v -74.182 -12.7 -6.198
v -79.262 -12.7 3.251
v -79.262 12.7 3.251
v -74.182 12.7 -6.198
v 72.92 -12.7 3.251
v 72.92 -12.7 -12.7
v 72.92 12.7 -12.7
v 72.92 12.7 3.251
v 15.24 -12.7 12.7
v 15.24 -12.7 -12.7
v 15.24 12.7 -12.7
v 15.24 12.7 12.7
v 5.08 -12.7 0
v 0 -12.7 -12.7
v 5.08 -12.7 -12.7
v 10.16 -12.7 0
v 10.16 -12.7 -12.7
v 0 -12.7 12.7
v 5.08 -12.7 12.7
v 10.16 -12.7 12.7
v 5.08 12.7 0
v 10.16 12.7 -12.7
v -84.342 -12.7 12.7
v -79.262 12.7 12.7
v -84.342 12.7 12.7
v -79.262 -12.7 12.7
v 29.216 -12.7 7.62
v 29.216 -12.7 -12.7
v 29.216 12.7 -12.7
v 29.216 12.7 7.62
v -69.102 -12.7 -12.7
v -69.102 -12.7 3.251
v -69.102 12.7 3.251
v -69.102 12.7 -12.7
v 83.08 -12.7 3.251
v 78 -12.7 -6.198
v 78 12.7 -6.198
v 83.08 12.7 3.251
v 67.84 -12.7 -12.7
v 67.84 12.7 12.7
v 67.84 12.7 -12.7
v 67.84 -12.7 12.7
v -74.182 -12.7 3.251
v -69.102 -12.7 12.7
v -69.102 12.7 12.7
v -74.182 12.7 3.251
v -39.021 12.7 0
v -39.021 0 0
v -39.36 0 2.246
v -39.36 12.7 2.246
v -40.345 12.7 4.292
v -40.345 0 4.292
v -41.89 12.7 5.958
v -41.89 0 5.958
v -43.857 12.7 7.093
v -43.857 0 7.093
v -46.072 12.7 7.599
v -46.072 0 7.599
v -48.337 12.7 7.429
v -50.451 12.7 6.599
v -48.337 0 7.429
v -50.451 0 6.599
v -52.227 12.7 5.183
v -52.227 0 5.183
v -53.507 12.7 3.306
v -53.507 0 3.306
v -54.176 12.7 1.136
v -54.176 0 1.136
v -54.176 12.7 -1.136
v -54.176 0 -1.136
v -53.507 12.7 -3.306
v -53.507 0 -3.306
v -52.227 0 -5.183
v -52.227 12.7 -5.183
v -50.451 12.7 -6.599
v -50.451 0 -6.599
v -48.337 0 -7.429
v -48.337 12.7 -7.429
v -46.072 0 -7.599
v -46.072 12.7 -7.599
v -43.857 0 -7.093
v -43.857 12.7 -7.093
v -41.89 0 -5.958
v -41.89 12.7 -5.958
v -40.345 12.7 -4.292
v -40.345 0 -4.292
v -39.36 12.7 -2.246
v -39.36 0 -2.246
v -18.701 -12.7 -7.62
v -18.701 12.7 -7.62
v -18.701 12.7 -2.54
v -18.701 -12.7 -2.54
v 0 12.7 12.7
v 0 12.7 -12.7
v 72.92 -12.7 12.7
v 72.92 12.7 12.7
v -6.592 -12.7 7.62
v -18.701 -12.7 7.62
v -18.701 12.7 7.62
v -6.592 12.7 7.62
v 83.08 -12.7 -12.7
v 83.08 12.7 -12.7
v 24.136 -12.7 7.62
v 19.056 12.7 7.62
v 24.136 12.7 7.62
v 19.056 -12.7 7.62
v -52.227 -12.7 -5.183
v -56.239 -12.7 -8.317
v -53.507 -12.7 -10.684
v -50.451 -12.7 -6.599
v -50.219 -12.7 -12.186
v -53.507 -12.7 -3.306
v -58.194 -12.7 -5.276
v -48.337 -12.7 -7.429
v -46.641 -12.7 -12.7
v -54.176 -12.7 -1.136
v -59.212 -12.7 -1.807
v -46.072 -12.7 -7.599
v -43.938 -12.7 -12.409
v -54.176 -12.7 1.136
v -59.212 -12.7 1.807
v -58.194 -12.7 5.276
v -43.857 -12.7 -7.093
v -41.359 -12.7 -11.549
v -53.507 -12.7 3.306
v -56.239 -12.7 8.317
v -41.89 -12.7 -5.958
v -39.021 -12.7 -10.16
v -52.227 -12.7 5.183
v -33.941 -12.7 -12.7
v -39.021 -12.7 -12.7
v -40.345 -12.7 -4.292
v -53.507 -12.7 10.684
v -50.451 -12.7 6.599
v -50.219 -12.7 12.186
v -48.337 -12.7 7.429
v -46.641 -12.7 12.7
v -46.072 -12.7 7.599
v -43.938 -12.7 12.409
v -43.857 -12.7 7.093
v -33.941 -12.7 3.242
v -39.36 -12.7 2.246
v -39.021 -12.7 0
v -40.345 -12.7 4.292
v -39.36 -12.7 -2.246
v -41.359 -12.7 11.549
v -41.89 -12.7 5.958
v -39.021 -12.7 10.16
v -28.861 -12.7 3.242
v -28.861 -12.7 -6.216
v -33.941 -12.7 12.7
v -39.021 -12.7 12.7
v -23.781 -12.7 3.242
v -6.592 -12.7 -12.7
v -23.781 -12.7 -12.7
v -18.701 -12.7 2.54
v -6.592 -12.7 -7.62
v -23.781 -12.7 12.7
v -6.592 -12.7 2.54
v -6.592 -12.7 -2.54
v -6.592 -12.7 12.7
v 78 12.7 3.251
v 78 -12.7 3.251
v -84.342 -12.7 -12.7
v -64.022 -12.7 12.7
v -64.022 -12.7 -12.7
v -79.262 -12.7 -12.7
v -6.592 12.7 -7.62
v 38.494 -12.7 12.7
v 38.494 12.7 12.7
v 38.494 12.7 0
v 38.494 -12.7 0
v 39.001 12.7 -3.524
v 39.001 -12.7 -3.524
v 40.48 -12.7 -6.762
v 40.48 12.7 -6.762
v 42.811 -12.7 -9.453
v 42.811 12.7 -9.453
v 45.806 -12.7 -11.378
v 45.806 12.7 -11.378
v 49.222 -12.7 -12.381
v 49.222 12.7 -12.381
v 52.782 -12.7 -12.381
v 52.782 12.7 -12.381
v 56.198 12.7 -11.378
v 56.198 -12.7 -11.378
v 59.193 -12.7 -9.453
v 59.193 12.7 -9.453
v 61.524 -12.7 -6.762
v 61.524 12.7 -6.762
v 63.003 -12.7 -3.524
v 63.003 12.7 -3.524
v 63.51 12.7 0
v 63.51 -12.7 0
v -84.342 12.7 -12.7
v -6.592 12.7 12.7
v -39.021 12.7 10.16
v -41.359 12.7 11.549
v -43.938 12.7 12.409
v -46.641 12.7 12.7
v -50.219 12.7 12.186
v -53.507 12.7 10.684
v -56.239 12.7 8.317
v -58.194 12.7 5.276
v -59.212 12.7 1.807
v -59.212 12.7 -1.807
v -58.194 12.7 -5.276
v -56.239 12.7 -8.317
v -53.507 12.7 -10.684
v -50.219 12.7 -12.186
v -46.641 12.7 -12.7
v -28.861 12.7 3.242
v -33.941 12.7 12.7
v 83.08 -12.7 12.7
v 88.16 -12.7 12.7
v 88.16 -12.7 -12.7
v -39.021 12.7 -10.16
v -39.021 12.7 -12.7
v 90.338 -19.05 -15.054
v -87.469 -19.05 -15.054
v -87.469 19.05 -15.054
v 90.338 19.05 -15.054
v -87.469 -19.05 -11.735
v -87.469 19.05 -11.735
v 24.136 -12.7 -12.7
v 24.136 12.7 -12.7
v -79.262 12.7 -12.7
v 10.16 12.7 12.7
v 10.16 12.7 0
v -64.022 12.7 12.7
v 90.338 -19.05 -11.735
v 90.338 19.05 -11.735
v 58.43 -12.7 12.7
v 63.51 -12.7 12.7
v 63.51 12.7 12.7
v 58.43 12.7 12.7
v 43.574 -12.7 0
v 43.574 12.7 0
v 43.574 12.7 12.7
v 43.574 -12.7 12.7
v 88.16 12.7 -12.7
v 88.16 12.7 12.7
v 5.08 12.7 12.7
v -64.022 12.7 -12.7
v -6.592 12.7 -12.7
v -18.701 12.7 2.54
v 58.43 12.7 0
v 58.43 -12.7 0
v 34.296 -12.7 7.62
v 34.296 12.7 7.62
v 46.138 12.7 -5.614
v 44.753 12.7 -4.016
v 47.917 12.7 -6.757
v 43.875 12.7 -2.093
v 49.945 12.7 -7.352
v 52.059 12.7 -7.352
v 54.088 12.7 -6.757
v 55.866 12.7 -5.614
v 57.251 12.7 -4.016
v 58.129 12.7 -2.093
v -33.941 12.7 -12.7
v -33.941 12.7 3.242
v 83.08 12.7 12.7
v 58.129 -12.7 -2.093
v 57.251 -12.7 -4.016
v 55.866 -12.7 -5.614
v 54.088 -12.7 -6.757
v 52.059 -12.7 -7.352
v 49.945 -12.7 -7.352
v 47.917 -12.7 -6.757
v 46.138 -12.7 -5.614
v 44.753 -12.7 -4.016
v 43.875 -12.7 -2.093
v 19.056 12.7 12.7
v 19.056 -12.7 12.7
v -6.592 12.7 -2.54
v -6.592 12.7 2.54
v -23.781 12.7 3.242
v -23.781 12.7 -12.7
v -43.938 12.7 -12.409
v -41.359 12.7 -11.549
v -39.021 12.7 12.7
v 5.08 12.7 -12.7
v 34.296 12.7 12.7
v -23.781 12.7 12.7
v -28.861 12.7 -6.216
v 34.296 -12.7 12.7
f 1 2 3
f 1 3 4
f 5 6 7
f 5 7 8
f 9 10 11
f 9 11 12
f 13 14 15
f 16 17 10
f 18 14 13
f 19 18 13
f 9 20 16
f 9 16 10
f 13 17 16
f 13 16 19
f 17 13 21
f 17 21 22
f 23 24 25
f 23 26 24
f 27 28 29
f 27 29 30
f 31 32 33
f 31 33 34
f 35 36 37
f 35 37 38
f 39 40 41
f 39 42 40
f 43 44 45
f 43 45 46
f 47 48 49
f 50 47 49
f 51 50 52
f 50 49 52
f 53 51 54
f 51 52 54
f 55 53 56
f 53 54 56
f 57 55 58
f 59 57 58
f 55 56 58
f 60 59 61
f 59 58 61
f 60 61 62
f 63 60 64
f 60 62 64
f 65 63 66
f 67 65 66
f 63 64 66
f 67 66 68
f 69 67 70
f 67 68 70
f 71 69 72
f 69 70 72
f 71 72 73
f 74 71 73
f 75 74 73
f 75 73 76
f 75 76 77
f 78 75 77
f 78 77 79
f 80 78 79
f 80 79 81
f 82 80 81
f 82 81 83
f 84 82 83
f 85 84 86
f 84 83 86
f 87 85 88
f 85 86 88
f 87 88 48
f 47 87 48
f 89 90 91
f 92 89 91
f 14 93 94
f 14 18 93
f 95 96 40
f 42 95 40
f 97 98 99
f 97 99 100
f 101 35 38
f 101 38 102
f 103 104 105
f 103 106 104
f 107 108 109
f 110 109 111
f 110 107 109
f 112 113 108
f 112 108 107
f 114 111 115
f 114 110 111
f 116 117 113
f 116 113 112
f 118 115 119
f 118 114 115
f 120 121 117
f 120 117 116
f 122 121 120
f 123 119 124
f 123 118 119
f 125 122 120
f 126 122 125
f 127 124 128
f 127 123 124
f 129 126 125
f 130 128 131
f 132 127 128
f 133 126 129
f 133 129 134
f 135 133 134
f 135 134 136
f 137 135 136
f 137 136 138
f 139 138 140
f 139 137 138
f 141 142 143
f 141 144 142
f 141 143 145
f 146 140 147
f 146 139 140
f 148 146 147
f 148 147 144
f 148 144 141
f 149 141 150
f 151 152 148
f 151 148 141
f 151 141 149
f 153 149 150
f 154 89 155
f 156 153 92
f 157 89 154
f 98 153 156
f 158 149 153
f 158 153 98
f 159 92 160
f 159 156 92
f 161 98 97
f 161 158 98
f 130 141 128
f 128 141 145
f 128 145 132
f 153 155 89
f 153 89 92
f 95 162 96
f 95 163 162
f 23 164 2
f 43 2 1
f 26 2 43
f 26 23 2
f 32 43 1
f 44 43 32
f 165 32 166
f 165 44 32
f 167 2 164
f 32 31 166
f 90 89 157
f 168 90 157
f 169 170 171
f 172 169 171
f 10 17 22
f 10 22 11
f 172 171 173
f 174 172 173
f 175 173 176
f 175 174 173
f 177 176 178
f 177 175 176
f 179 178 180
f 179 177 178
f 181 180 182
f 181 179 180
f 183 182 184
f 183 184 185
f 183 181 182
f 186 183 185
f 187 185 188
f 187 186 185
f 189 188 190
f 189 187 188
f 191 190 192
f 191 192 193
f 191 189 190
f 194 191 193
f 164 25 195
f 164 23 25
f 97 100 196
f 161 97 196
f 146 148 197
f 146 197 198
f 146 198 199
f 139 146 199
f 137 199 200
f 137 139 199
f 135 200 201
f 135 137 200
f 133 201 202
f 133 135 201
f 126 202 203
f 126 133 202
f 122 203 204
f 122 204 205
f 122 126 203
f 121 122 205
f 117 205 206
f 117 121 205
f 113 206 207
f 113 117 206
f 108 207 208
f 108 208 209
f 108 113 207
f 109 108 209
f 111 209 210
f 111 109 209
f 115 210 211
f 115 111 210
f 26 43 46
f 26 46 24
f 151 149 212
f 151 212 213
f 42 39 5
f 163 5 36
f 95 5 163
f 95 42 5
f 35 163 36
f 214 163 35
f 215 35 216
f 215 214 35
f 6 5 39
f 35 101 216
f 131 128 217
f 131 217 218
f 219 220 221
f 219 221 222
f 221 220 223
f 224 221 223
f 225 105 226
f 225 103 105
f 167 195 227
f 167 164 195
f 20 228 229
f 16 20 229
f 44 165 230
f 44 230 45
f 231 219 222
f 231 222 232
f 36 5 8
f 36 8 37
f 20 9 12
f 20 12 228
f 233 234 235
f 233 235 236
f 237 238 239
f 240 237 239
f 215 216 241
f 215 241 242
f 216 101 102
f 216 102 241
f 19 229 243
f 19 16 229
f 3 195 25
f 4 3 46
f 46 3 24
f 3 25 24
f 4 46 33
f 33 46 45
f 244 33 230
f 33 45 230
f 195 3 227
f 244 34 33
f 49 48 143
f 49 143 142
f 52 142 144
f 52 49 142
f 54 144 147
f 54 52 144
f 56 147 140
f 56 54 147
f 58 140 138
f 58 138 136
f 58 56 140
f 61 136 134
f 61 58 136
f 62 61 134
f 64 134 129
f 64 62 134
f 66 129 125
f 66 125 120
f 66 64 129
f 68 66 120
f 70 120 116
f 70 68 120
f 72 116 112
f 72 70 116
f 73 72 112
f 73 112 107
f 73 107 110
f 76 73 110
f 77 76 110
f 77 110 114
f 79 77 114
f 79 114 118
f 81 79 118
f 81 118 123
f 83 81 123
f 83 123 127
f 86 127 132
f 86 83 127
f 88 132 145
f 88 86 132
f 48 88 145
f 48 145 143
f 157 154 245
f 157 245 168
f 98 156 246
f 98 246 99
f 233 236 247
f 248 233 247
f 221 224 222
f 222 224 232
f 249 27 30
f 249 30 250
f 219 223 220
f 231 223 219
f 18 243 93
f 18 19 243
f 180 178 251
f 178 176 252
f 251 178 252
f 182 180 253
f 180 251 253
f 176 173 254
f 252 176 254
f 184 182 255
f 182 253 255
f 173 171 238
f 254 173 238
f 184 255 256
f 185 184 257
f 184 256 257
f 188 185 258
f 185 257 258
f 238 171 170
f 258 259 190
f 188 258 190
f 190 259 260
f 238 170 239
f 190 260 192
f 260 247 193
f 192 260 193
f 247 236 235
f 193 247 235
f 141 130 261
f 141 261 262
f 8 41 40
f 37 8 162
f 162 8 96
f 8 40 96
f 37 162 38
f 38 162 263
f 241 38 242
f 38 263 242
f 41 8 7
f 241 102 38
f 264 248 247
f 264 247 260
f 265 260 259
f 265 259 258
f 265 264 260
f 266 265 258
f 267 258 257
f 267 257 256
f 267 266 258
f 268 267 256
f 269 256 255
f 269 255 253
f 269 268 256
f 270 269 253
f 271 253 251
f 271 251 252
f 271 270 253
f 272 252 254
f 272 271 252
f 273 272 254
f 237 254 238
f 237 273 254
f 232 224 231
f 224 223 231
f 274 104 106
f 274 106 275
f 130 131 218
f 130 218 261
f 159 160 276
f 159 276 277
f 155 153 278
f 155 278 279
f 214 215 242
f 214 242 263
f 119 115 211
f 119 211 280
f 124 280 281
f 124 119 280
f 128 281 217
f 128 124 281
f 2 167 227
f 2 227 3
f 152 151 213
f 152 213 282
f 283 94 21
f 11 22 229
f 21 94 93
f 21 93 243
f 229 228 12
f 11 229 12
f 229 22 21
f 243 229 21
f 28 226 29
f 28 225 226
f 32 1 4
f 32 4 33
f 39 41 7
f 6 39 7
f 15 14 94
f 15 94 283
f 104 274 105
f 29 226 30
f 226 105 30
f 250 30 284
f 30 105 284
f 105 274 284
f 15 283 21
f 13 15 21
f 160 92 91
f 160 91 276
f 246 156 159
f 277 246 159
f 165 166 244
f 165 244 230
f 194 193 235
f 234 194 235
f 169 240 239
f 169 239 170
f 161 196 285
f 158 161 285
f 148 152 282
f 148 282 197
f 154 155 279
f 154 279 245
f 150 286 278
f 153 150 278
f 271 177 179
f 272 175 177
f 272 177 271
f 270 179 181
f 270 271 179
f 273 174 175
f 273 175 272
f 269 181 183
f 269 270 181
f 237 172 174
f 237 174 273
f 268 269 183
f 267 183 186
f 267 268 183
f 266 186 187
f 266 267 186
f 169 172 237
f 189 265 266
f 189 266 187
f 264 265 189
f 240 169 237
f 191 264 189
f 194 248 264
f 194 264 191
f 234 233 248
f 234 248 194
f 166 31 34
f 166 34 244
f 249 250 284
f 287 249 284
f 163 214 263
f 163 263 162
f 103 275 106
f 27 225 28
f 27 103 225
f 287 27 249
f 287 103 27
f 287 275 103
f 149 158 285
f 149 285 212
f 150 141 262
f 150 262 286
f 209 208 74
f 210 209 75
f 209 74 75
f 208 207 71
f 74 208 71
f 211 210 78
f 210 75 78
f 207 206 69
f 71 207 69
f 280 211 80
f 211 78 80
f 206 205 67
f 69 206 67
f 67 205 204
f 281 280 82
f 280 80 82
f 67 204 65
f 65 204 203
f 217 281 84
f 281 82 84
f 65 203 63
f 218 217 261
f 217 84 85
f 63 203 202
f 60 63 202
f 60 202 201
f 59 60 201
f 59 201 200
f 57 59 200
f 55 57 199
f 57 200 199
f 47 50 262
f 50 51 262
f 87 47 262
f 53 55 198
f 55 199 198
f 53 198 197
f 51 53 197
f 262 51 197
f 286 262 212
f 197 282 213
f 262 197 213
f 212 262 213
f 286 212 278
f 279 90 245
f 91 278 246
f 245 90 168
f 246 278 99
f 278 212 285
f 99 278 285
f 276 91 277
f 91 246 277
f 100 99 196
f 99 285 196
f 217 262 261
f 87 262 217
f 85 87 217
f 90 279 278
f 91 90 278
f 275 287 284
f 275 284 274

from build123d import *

# Parameters (mm, degrees)
F1_DEPTH = 6.35
F0_R     = 3.81
F0_W     = 6.0548761711
F0_H     = 2.54
F0_W_2   = 2.54
F0_H_2   = 10.16
F2_W     = 88.9036133885
F2_H     = 1.6595339403
F3_DEPTH = 9.525
F4_SCALE = 2


with BuildPart() as f1:
    # F0 (on Front) → F1 (new body, symmetric)
    with BuildSketch(Plane.XZ):
        Polygon((-42.1707964678, -6.35), (-39.6307964678, -6.35), (-39.6307964678, 1.6256), (-42.1707964678, 6.35), align=None)
        Polygon((-42.1707964678, 6.35), (-39.6307964678, 1.6256), (-39.6307964678, 6.35), align=None)
        Polygon((-39.6307964678, 6.35), (-39.6307964678, 1.6256), (-37.0907964678, -3.0988), (-37.0907964678, 1.6256), align=None)
        Polygon((-37.0907964678, 1.6256), (-37.0907964678, -3.0988), (-34.5507964678, 1.6256), (-34.5507964678, 6.35), align=None)
        Polygon((-34.5507964678, 6.35), (-34.5507964678, 1.6256), (-32.0107964678, 6.35), align=None)
        Polygon((-34.5507964678, 1.6256), (-34.5507964678, -6.35), (-32.0107964678, -6.35), (-32.0107964678, 6.35), align=None)
    extrude(amount=F1_DEPTH, both=True)


with BuildPart() as f1b:
    # F0 (on Front) → F1, piece 2 (new body, symmetric)
    with BuildSketch(Plane.XZ):
        with BuildLine():
            ThreePointArc((-23.3206523725, 6.35), (-29.6706523725, 0), (-23.3206523725, -6.35))
            ThreePointArc((-23.3206523725, -6.35), (-21.3126060583, -6.0241389426), (-19.5106523725, -5.08))
            Line((-19.5106523725, -5.08), (-19.5106523725, 0))
            Line((-19.5106523725, 0), (-19.5106523725, 5.08))
            ThreePointArc((-19.5106523725, 5.08), (-21.3126060583, 6.0241389426), (-23.3206523725, 6.35))
        make_face()
        with Locations((-23.3206523725, 0)):
            Circle(F0_R, mode=Mode.SUBTRACT)
        with BuildLine():
            ThreePointArc((-16.9706523725, 0), (-17.6410397097, 2.8398063314), (-19.5106523725, 5.08))
            Line((-19.5106523725, 5.08), (-19.5106523725, 0))
            Line((-19.5106523725, 0), (-16.9706523725, 0))
        make_face()
        with BuildLine():
            Line((-19.5106523725, 0), (-19.5106523725, -5.08))
            ThreePointArc((-19.5106523725, -5.08), (-17.6410397097, -2.8398063314), (-16.9706523725, 0))
            Line((-16.9706523725, 0), (-19.5106523725, 0))
        make_face()
        with BuildLine():
            Line((-19.5106523725, -5.08), (-19.5106523725, -6.35))
            Line((-19.5106523725, -6.35), (-16.9706523725, -6.35))
            Line((-16.9706523725, -6.35), (-16.9706523725, 0))
            ThreePointArc((-16.9706523725, 0), (-17.6410397097, -2.8398063314), (-19.5106523725, -5.08))
        make_face()
        Polygon((-16.9706523725, 6.35), (-19.5106523725, 6.35), (-16.9706523725, 1.621060252), align=None)
        with BuildLine():
            Line((-16.9706523725, 1.621060252), (-19.5106523725, 6.35))
            Line((-19.5106523725, 6.35), (-19.5106523725, 5.08))
            ThreePointArc((-19.5106523725, 5.08), (-17.6410397097, 2.8398063314), (-16.9706523725, 0))
            Line((-16.9706523725, 0), (-16.9706523725, 1.621060252))
        make_face()
        Polygon((-14.4306523725, 1.621060252), (-16.9706523725, 6.35), (-16.9706523725, 1.621060252), (-14.4306523725, -3.1078794961), align=None)
        Polygon((-11.8906523725, 6.35), (-14.4306523725, 1.621060252), (-14.4306523725, -3.1078794961), (-11.8906523725, 1.621060252), (-11.8906523725, 3.81), align=None)
        Polygon((-9.3506523725, 6.35), (-11.8906523725, 6.35), (-11.8906523725, 3.81), (-10.7149328125, 3.81), align=None)
        Polygon((-11.8906523725, 3.81), (-11.8906523725, 1.621060252), (-10.7149328125, 3.81), align=None)
        with Locations((-6.323214287, 5.08)):
            Rectangle(F0_W, F0_H)
        Polygon((-10.7149328125, 3.81), (-11.8906523725, 1.621060252), (-11.8906523725, 1.27), (-9.3506523725, 1.27), (-9.3506523725, 3.81), align=None)
        Polygon((-9.3506523725, 3.81), (-9.3506523725, 6.35), (-10.7149328125, 3.81), align=None)
        with Locations((-10.6206523725, 0)):
            Rectangle(F0_W_2, F0_H)
        with Locations((-6.323214287, 0)):
            Rectangle(F0_W, F0_H)
        with Locations((-10.6206523725, -2.54)):
            Rectangle(F0_W_2, F0_H)
        with Locations((-10.6206523725, -5.08)):
            Rectangle(F0_W_2, F0_H)
        with Locations((-6.323214287, -5.08)):
            Rectangle(F0_W, F0_H)
    extrude(amount=F1_DEPTH, both=True)


with BuildPart() as f1c:
    # F0 (on Front) → F1, piece 3 (new body, symmetric)
    with BuildSketch(Plane.XZ):
        Polygon((0, 6.35), (0, -6.35), (2.54, -6.35), (2.54, 0), align=None)
        Polygon((2.54, 6.35), (0, 6.35), (2.54, 0), align=None)
        Polygon((5.08, 0), (2.54, 6.35), (2.54, 0), (5.08, -6.35), align=None)
        Polygon((5.08, 0), (5.08, -6.35), (7.62, -6.35), align=None)
        Polygon((5.08, 6.35), (5.08, 0), (7.62, -6.35), (7.62, 6.35), align=None)
    extrude(amount=F1_DEPTH, both=True)


with BuildPart() as f1d:
    # F0 (on Front) → F1, piece 4 (new body, symmetric)
    with BuildSketch(Plane.XZ):
        with Locations((13.3382392576, -1.27)):
            Rectangle(F0_W_2, F0_H_2)
        with Locations((15.8782392576, 5.08)):
            Rectangle(F0_W_2, F0_H)
        with Locations((13.3382392576, 5.08)):
            Rectangle(F0_W_2, F0_H)
        with Locations((10.7982392576, 5.08)):
            Rectangle(F0_W_2, F0_H)
    extrude(amount=F1_DEPTH, both=True)


with BuildPart() as f1e:
    # F0 (on Front) → F1, piece 5 (new body, symmetric)
    with BuildSketch(Plane.XZ):
        with BuildLine():
            Line((31.7550115287, 0), (31.7550115287, 6.35))
            Line((31.7550115287, 6.35), (29.2150115287, 6.35))
            Line((29.2150115287, 6.35), (29.2150115287, 0))
            ThreePointArc((29.2150115287, 0), (25.5010910332, -3.7139204955), (21.7871705377, 0))
            Line((21.7871705377, 0), (21.7871705377, 6.35))
            Line((21.7871705377, 6.35), (19.2471705377, 6.35))
            Line((19.2471705377, 6.35), (19.2471705377, 0))
            ThreePointArc((19.2471705377, 0), (25.5010910332, -6.2539204955), (31.7550115287, 0))
        make_face()
    extrude(amount=F1_DEPTH, both=True)


with BuildPart() as f1f:
    # F0 (on Front) → F1, piece 6 (new body, symmetric)
    with BuildSketch(Plane.XZ):
        Polygon((33.9198186994, 6.35), (33.9198186994, -6.35), (36.4598186994, -6.35), (36.4598186994, 1.6256), align=None)
        Polygon((36.4598186994, 6.35), (33.9198186994, 6.35), (36.4598186994, 1.6256), align=None)
        Polygon((36.4598186994, 6.35), (36.4598186994, 1.6256), (38.9998186994, -3.0988), (38.9998186994, 1.6256), align=None)
        Polygon((38.9998186994, 1.6256), (38.9998186994, -3.0988), (41.5398186994, 1.6256), (41.5398186994, 6.35), align=None)
        Polygon((41.5398186994, 6.35), (41.5398186994, 1.6256), (44.0798186994, 6.35), align=None)
        Polygon((41.5398186994, 1.6256), (41.5398186994, -6.35), (44.0798186994, -6.35), (44.0798186994, 6.35), align=None)
    extrude(amount=F1_DEPTH, both=True)


with BuildPart() as f3:
    # F2 (on Front) → F3 (new body, symmetric)
    with BuildSketch(Plane.XZ):
        with Locations((0.7174350321, -6.6974051297)):
            Rectangle(F2_W, F2_H)
    extrude(amount=F3_DEPTH, both=True)


with BuildPart() as f1d_1:
    # F4: moved
    add(f1d.part.scale(F4_SCALE))


with BuildPart() as f1_1:
    # F4: moved
    add(f1.part.scale(F4_SCALE))


with BuildPart() as f1b_1:
    # F4: moved
    add(f1b.part.scale(F4_SCALE))


with BuildPart() as f1c_1:
    # F4: moved
    add(f1c.part.scale(F4_SCALE))


with BuildPart() as f1e_1:
    # F4: moved
    add(f1e.part.scale(F4_SCALE))


with BuildPart() as f1f_1:
    # F4: moved
    add(f1f.part.scale(F4_SCALE))


with BuildPart() as f3_1:
    # F4: moved
    add(f3.part.scale(F4_SCALE))


solid = Compound([f1d_1.part, f1_1.part, f1b_1.part, f1c_1.part, f1e_1.part, f1f_1.part, f3_1.part])
